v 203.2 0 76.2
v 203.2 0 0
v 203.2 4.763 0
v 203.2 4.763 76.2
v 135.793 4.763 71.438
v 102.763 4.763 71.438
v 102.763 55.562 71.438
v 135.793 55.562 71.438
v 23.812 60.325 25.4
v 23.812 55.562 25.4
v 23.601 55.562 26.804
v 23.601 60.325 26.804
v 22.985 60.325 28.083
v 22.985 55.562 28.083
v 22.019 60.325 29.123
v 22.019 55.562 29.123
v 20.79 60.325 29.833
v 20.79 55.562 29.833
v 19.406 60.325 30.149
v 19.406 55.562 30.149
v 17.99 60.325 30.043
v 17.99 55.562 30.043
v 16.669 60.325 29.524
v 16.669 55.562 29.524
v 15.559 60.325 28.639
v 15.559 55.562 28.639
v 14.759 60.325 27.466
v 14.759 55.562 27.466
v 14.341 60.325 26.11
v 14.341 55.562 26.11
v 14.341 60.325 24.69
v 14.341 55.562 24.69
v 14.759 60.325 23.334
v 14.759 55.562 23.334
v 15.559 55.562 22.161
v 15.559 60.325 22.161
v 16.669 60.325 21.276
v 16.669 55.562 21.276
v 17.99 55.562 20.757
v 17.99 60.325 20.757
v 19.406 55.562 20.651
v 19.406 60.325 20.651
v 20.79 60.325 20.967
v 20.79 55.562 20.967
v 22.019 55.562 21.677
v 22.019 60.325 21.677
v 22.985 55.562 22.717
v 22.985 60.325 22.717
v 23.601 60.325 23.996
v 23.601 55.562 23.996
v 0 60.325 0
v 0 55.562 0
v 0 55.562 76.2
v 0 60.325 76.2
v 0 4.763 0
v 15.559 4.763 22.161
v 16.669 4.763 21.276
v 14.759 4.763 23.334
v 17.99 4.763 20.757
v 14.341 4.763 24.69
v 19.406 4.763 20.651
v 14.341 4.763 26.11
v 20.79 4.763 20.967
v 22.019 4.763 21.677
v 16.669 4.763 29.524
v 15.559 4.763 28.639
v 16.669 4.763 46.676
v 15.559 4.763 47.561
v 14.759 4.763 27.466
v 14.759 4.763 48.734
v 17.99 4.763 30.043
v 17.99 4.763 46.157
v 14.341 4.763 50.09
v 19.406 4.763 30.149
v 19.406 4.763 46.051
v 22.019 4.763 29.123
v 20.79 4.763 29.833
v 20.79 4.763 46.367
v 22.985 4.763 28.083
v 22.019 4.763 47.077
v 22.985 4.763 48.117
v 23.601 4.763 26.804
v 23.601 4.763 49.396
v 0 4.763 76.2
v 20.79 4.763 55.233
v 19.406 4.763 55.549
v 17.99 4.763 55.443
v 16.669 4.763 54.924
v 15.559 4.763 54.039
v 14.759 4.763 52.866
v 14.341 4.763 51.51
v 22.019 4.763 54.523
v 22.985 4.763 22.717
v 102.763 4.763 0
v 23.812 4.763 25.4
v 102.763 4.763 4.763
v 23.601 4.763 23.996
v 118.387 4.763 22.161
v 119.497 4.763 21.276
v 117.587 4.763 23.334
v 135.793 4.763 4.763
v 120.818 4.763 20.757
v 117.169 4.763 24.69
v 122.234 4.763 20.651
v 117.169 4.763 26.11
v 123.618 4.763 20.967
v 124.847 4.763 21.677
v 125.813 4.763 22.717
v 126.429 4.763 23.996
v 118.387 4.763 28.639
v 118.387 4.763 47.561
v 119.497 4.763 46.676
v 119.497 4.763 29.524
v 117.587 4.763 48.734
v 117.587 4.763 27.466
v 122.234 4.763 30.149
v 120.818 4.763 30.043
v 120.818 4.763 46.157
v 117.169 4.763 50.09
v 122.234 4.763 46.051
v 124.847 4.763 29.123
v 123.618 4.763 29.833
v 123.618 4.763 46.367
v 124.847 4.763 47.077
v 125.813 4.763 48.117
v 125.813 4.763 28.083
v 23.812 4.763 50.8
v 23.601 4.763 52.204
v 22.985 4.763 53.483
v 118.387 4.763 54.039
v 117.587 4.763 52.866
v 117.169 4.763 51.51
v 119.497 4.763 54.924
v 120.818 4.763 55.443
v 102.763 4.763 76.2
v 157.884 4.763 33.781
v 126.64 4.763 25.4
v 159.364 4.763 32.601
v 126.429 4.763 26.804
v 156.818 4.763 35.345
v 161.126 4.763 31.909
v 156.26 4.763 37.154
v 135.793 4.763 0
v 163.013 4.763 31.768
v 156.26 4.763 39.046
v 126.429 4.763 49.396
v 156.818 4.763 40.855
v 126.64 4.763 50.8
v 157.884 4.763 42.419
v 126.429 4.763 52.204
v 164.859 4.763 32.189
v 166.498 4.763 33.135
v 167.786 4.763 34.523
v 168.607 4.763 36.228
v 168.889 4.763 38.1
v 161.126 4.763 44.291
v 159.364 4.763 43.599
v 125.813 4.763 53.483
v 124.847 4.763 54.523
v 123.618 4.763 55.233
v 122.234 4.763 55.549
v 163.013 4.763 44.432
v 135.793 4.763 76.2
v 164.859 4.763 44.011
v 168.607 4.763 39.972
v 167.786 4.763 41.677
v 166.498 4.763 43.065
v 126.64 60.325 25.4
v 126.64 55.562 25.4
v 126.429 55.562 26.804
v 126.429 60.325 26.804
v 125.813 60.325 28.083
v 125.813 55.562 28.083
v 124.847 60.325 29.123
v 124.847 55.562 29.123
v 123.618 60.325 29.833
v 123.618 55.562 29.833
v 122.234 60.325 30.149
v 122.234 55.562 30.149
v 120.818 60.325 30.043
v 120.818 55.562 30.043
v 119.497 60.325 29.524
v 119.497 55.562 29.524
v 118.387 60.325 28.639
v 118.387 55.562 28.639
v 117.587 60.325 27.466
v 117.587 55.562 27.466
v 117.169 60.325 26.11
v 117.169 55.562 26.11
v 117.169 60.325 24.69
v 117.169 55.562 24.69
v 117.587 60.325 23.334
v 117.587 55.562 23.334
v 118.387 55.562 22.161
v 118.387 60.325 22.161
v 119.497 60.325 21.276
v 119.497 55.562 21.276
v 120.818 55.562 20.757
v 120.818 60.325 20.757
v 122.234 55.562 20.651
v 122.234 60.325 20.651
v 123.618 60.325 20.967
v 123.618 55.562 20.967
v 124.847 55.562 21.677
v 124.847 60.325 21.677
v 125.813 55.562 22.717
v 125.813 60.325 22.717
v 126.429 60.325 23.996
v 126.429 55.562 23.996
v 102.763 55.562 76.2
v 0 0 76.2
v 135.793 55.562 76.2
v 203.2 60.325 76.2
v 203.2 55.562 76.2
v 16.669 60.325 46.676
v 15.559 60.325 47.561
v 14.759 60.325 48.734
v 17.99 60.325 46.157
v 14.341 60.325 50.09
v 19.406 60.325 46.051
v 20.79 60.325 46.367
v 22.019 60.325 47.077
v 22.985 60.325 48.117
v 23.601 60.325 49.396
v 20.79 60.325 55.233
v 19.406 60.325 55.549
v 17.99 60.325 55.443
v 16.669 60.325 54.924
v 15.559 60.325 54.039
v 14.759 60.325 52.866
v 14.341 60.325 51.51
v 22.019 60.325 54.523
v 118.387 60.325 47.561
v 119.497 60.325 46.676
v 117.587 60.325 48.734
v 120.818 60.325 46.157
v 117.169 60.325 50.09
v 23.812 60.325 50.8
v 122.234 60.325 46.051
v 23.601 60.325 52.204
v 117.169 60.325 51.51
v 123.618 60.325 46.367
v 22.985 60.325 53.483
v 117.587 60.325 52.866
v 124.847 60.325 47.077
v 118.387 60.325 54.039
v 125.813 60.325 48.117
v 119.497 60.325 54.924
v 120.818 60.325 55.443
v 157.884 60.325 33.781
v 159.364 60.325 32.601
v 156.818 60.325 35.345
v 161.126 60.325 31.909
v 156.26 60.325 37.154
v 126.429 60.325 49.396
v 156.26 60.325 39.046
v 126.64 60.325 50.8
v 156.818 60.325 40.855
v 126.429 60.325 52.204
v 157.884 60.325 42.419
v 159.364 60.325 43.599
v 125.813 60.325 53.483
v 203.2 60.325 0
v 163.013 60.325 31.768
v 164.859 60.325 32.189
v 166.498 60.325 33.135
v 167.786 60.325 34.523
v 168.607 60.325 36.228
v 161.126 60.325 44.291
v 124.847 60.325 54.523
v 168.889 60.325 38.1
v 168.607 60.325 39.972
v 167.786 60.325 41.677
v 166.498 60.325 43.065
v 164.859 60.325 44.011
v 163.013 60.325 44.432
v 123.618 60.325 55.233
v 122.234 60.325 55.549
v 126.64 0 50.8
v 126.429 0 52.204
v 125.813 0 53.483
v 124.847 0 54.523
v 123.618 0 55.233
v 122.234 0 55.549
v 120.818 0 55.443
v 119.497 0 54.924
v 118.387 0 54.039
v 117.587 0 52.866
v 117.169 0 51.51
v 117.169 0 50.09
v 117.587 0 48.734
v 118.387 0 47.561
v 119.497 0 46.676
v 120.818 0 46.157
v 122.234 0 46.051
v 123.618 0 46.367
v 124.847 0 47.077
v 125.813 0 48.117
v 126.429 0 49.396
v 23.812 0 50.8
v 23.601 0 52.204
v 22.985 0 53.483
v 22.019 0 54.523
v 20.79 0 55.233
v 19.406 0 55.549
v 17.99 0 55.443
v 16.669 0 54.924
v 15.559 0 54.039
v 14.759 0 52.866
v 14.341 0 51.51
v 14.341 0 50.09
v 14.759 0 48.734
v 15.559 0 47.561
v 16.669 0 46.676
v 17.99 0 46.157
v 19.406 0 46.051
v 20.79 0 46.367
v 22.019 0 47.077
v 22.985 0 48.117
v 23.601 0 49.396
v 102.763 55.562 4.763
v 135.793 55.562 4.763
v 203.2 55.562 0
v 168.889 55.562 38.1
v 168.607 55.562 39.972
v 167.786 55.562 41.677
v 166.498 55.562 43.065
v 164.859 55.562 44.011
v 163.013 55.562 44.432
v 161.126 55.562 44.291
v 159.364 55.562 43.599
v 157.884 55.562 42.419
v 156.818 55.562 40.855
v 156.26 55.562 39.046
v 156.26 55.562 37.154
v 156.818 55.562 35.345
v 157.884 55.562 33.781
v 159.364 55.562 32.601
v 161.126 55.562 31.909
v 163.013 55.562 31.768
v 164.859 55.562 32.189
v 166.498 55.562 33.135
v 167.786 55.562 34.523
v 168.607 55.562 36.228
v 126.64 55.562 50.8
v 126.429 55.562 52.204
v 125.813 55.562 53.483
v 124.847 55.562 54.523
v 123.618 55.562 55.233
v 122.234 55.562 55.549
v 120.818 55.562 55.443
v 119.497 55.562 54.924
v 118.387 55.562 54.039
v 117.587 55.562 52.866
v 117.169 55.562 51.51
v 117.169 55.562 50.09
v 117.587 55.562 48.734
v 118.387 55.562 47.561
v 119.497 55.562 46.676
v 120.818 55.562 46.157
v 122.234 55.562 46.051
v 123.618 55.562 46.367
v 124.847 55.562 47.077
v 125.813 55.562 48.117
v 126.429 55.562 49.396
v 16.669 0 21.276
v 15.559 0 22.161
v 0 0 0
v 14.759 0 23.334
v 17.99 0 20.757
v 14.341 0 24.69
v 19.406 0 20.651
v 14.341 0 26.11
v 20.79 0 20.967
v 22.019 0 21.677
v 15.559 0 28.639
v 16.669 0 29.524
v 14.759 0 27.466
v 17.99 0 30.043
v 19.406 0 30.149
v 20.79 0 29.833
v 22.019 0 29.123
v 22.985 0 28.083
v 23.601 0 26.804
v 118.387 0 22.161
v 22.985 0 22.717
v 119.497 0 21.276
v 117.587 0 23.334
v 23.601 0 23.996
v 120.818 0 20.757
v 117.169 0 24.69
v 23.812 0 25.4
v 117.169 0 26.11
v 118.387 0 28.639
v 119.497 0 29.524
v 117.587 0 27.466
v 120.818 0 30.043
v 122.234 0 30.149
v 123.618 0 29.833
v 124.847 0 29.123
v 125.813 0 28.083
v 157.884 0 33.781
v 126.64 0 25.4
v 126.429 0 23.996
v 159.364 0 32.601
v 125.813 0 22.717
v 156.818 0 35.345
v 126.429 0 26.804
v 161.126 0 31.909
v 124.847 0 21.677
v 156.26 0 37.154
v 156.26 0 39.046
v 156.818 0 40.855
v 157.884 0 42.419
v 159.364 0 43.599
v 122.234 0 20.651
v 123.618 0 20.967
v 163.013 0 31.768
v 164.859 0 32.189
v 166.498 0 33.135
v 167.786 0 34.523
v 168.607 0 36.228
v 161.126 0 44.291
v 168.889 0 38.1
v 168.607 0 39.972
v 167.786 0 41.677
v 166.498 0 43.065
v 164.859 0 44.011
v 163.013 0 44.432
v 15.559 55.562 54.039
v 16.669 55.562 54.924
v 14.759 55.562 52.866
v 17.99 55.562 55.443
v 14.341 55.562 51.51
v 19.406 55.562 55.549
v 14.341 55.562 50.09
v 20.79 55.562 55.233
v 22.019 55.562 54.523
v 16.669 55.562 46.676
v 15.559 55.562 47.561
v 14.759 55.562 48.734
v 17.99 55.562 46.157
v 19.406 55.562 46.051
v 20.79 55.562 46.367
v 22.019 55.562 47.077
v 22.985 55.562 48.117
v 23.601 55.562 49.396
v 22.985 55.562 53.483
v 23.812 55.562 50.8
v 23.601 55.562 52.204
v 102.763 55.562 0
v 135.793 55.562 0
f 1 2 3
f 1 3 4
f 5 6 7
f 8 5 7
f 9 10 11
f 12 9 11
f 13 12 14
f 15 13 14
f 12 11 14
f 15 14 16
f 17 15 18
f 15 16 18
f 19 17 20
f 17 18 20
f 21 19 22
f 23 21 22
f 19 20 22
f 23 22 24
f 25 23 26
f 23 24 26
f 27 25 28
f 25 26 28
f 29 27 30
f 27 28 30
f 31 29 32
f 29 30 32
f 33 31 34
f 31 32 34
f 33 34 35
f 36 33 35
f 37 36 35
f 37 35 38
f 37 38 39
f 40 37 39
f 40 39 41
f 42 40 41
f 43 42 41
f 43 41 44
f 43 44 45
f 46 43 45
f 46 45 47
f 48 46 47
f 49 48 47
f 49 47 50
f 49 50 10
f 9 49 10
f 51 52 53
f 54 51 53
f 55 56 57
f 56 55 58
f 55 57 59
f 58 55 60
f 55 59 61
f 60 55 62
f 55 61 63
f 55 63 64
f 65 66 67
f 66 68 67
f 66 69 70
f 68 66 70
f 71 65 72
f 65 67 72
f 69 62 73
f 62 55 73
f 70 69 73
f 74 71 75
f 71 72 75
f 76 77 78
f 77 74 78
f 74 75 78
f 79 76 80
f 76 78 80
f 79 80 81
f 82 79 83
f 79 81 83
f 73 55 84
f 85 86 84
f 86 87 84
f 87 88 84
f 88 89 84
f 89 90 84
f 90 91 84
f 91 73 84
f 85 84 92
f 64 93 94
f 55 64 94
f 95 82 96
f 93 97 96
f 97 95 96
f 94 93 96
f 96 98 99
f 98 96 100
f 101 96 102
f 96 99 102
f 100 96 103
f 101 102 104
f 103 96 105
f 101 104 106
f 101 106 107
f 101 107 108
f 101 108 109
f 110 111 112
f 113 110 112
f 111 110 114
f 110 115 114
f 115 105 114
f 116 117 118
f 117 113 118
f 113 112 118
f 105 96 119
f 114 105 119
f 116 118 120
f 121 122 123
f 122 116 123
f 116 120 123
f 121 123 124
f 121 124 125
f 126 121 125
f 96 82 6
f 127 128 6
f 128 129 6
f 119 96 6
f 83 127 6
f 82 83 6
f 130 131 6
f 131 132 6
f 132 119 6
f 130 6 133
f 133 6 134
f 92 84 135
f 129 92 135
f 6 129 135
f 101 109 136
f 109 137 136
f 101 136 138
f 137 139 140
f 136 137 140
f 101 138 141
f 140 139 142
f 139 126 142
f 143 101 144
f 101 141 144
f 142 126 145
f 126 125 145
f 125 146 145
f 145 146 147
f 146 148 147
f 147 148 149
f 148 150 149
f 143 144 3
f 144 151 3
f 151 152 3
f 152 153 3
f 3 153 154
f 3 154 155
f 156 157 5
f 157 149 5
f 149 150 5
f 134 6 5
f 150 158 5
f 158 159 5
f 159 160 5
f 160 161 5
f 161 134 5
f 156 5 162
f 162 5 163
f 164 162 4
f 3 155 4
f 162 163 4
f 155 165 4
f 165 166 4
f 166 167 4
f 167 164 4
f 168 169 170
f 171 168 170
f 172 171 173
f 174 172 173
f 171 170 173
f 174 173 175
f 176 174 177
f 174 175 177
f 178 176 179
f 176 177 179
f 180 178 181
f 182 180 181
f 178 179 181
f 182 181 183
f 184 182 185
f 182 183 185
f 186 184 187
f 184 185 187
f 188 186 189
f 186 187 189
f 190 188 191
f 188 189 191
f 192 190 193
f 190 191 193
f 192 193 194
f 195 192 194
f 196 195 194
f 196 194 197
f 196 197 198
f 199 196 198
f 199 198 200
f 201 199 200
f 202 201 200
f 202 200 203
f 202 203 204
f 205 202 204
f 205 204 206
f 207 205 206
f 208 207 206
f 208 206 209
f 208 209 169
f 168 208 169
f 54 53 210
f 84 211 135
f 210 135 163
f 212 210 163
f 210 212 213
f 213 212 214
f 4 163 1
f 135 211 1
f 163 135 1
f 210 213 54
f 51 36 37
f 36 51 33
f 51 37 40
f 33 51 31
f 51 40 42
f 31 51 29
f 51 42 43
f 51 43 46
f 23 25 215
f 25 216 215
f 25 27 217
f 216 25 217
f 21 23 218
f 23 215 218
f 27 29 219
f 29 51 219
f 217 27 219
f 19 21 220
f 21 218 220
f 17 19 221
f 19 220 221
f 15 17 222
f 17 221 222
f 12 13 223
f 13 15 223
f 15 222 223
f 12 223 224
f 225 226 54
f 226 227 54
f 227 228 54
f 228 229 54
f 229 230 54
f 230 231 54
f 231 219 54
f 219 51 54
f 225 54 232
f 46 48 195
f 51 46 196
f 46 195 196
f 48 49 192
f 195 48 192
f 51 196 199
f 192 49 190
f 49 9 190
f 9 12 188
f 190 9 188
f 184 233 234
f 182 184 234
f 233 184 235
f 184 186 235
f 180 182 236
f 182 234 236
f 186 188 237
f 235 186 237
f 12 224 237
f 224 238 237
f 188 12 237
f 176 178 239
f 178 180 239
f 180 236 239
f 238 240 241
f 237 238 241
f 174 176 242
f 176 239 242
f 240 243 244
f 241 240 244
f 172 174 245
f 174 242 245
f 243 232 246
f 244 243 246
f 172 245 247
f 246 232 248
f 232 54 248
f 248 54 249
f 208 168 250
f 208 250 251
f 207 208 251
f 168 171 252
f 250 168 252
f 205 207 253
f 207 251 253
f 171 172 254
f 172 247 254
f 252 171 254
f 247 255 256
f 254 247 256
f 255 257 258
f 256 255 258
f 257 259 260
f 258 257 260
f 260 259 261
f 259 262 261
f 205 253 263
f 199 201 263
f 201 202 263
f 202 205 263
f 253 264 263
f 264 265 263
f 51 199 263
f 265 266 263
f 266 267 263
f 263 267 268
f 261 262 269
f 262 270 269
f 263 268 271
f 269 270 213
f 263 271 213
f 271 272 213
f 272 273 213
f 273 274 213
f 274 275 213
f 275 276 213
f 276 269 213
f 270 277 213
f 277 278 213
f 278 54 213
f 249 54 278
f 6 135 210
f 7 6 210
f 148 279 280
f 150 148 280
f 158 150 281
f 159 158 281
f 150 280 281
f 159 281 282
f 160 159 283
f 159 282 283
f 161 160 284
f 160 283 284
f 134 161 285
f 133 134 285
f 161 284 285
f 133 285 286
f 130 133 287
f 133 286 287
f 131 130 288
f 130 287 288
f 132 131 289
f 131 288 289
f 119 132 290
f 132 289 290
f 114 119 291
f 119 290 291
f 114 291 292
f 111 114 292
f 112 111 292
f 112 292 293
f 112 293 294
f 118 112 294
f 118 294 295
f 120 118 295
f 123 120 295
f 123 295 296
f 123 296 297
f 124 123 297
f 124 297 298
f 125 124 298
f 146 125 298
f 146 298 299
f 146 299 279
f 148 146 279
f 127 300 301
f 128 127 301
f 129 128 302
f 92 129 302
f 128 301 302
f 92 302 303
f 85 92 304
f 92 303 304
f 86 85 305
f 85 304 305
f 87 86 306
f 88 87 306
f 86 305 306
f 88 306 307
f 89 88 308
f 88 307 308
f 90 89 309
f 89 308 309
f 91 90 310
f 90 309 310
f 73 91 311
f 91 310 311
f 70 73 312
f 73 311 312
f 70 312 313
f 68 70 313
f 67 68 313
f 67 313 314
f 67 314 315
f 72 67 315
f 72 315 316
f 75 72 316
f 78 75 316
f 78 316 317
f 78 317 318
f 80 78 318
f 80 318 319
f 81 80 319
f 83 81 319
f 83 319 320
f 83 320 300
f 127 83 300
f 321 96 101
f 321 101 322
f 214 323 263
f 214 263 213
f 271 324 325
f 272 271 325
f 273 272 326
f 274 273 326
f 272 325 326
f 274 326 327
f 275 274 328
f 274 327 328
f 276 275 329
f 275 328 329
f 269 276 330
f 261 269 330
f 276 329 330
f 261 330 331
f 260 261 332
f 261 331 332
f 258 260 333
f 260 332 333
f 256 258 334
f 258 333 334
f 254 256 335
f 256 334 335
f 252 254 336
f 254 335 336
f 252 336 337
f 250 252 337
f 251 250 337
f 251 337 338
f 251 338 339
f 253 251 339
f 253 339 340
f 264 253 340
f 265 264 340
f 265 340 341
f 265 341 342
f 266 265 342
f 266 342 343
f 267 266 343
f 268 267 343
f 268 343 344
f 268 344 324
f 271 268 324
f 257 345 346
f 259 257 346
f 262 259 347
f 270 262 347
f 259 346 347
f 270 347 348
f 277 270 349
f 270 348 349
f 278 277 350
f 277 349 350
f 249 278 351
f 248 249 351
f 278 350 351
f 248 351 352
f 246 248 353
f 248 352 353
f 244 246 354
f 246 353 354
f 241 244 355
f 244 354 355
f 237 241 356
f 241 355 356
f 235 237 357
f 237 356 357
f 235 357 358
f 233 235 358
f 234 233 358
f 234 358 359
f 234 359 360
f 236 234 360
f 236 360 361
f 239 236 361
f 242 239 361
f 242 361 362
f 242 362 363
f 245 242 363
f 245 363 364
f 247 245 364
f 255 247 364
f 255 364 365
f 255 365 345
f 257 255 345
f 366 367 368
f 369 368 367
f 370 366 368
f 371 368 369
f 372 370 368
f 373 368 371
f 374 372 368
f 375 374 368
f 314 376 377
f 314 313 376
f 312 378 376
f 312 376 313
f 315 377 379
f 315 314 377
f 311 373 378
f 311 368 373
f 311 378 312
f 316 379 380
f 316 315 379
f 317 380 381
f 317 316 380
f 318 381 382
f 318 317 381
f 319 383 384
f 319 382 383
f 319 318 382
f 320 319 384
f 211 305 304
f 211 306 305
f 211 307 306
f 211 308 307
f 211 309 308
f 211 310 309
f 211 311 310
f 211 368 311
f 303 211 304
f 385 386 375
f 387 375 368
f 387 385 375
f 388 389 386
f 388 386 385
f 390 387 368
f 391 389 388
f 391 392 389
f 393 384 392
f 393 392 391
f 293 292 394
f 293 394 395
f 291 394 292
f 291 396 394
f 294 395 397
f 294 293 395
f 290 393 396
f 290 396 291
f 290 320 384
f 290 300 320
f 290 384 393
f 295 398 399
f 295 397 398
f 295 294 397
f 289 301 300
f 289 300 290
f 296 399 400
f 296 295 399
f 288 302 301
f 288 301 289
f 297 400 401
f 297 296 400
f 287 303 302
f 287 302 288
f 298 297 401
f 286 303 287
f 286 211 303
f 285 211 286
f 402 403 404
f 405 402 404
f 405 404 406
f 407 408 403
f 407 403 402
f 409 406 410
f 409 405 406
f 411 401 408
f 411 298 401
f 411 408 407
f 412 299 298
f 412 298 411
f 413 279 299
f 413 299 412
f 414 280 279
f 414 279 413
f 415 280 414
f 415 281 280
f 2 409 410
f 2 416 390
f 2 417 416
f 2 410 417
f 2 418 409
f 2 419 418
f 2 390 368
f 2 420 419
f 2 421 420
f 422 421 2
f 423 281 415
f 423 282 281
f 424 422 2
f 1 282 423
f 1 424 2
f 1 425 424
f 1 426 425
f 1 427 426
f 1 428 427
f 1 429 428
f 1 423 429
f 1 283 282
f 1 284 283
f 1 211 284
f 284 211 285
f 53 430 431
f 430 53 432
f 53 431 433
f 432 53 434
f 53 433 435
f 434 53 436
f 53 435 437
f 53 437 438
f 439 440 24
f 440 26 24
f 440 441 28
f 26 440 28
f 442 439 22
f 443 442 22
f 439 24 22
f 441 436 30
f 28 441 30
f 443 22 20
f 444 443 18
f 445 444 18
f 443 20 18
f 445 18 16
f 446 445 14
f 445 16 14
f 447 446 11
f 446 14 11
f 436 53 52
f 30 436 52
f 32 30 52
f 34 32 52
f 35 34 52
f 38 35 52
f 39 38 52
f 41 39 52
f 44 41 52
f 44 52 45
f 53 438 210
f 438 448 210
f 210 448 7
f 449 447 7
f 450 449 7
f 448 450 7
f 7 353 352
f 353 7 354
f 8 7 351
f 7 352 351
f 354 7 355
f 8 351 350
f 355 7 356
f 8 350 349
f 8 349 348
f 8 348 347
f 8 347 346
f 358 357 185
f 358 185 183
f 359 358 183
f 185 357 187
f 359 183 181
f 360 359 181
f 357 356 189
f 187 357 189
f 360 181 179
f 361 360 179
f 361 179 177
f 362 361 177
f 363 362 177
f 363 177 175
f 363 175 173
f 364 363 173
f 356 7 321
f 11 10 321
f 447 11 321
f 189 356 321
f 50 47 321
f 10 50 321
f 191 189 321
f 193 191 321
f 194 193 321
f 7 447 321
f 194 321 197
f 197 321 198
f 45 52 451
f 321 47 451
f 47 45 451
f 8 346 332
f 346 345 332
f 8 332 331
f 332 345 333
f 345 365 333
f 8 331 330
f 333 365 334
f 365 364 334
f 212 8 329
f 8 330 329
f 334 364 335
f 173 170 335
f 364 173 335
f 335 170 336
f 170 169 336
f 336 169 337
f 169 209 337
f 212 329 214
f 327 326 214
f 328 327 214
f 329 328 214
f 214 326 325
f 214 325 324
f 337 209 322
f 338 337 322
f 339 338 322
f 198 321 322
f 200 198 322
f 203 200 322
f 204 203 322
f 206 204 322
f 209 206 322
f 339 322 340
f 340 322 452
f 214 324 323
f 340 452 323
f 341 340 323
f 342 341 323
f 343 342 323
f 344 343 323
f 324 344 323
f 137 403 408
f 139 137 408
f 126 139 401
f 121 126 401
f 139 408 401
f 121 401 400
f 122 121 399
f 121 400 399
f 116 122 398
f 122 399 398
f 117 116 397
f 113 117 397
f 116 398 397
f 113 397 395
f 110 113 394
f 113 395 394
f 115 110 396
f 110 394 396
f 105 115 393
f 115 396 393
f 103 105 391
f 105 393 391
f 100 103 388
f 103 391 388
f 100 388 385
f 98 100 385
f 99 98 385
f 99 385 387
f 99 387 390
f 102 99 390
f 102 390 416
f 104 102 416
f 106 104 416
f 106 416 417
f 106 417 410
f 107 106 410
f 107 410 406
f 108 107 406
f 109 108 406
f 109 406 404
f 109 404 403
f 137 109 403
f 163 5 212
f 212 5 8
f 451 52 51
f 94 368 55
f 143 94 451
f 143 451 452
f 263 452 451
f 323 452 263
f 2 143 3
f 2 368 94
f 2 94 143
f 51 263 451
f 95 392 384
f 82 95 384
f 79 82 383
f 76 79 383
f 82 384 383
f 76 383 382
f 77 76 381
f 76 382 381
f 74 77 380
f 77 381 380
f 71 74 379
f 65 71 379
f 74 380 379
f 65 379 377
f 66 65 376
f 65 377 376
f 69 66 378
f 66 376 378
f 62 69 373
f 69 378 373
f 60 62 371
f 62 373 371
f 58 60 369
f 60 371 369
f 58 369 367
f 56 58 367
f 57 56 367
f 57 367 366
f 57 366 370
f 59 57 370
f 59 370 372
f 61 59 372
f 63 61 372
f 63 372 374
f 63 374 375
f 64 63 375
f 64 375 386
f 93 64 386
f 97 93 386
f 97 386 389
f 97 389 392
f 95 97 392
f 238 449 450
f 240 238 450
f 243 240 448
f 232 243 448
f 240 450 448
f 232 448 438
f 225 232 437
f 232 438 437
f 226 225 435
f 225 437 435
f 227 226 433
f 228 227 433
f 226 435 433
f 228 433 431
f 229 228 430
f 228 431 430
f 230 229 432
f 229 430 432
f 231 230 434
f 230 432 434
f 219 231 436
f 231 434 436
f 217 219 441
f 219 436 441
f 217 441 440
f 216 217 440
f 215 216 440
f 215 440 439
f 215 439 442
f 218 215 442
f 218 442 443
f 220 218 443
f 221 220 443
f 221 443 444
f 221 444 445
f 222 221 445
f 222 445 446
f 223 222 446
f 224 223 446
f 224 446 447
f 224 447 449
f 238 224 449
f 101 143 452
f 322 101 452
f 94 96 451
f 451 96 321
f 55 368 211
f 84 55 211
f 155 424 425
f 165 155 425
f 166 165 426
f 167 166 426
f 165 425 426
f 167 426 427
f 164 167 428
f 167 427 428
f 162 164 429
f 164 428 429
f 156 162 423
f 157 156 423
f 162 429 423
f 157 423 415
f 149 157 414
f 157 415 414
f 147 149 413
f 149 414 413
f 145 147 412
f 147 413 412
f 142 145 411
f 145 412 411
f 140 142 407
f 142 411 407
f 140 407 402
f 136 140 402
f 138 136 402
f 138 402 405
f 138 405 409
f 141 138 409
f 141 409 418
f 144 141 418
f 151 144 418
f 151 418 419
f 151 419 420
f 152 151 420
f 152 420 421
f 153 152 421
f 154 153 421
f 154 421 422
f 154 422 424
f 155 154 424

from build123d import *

# Parameters (mm, degrees)
F0_W     = 203.2
F0_H     = 76.2
F0_R     = 4.7625
F0_R_2   = 6.35
F1_DEPTH = 60.325
F3_W     = 102.7627293737
F3_H     = 50.8
F4_DEPTH = 85.725
F5_W     = 50.8
F5_H     = 66.675
F6_DEPTH = 203.2
F7_W     = 67.4074530634
F7_H     = 50.8
F8_DEPTH = 76.2


with BuildPart() as f1:
    # F0 (on Front) → F1 (new body)
    with BuildSketch(Plane.XZ):
        with Locations((101.6, 38.1)):
            Rectangle(F0_W, F0_H)
        with Locations((19.05, 25.4)):
            Circle(F0_R, mode=Mode.SUBTRACT)
        with Locations((121.8779161572, 25.4)):
            Circle(F0_R, mode=Mode.SUBTRACT)
        with Locations((19.05, 50.8)):
            Circle(F0_R, mode=Mode.SUBTRACT)
        with Locations((121.8779161572, 50.8)):
            Circle(F0_R, mode=Mode.SUBTRACT)
        with Locations((162.5389580786, 38.1)):
            Circle(F0_R_2, mode=Mode.SUBTRACT)
    extrude(amount=-F1_DEPTH)

    # F3 (on offset) → F4 (cut)
    with BuildSketch(Plane.XY.offset(76.2)):
        with Locations((51.3813646869, 30.1625)):
            Rectangle(F3_W, F3_H)
    extrude(amount=-F4_DEPTH, mode=Mode.SUBTRACT)

    # F5 (on Right) → F6 (cut)
    with BuildSketch(Plane.YZ):
        with Locations((30.1625, 38.1)):
            Rectangle(F5_W, F5_H)
    extrude(amount=F6_DEPTH, mode=Mode.SUBTRACT)

    # F7 (on Top) → F8 (cut)
    with BuildSketch(Plane.XY):
        with Locations((169.4962734683, 30.1625)):
            Rectangle(F7_W, F7_H)
    extrude(amount=F8_DEPTH, mode=Mode.SUBTRACT)


solid = f1.part
